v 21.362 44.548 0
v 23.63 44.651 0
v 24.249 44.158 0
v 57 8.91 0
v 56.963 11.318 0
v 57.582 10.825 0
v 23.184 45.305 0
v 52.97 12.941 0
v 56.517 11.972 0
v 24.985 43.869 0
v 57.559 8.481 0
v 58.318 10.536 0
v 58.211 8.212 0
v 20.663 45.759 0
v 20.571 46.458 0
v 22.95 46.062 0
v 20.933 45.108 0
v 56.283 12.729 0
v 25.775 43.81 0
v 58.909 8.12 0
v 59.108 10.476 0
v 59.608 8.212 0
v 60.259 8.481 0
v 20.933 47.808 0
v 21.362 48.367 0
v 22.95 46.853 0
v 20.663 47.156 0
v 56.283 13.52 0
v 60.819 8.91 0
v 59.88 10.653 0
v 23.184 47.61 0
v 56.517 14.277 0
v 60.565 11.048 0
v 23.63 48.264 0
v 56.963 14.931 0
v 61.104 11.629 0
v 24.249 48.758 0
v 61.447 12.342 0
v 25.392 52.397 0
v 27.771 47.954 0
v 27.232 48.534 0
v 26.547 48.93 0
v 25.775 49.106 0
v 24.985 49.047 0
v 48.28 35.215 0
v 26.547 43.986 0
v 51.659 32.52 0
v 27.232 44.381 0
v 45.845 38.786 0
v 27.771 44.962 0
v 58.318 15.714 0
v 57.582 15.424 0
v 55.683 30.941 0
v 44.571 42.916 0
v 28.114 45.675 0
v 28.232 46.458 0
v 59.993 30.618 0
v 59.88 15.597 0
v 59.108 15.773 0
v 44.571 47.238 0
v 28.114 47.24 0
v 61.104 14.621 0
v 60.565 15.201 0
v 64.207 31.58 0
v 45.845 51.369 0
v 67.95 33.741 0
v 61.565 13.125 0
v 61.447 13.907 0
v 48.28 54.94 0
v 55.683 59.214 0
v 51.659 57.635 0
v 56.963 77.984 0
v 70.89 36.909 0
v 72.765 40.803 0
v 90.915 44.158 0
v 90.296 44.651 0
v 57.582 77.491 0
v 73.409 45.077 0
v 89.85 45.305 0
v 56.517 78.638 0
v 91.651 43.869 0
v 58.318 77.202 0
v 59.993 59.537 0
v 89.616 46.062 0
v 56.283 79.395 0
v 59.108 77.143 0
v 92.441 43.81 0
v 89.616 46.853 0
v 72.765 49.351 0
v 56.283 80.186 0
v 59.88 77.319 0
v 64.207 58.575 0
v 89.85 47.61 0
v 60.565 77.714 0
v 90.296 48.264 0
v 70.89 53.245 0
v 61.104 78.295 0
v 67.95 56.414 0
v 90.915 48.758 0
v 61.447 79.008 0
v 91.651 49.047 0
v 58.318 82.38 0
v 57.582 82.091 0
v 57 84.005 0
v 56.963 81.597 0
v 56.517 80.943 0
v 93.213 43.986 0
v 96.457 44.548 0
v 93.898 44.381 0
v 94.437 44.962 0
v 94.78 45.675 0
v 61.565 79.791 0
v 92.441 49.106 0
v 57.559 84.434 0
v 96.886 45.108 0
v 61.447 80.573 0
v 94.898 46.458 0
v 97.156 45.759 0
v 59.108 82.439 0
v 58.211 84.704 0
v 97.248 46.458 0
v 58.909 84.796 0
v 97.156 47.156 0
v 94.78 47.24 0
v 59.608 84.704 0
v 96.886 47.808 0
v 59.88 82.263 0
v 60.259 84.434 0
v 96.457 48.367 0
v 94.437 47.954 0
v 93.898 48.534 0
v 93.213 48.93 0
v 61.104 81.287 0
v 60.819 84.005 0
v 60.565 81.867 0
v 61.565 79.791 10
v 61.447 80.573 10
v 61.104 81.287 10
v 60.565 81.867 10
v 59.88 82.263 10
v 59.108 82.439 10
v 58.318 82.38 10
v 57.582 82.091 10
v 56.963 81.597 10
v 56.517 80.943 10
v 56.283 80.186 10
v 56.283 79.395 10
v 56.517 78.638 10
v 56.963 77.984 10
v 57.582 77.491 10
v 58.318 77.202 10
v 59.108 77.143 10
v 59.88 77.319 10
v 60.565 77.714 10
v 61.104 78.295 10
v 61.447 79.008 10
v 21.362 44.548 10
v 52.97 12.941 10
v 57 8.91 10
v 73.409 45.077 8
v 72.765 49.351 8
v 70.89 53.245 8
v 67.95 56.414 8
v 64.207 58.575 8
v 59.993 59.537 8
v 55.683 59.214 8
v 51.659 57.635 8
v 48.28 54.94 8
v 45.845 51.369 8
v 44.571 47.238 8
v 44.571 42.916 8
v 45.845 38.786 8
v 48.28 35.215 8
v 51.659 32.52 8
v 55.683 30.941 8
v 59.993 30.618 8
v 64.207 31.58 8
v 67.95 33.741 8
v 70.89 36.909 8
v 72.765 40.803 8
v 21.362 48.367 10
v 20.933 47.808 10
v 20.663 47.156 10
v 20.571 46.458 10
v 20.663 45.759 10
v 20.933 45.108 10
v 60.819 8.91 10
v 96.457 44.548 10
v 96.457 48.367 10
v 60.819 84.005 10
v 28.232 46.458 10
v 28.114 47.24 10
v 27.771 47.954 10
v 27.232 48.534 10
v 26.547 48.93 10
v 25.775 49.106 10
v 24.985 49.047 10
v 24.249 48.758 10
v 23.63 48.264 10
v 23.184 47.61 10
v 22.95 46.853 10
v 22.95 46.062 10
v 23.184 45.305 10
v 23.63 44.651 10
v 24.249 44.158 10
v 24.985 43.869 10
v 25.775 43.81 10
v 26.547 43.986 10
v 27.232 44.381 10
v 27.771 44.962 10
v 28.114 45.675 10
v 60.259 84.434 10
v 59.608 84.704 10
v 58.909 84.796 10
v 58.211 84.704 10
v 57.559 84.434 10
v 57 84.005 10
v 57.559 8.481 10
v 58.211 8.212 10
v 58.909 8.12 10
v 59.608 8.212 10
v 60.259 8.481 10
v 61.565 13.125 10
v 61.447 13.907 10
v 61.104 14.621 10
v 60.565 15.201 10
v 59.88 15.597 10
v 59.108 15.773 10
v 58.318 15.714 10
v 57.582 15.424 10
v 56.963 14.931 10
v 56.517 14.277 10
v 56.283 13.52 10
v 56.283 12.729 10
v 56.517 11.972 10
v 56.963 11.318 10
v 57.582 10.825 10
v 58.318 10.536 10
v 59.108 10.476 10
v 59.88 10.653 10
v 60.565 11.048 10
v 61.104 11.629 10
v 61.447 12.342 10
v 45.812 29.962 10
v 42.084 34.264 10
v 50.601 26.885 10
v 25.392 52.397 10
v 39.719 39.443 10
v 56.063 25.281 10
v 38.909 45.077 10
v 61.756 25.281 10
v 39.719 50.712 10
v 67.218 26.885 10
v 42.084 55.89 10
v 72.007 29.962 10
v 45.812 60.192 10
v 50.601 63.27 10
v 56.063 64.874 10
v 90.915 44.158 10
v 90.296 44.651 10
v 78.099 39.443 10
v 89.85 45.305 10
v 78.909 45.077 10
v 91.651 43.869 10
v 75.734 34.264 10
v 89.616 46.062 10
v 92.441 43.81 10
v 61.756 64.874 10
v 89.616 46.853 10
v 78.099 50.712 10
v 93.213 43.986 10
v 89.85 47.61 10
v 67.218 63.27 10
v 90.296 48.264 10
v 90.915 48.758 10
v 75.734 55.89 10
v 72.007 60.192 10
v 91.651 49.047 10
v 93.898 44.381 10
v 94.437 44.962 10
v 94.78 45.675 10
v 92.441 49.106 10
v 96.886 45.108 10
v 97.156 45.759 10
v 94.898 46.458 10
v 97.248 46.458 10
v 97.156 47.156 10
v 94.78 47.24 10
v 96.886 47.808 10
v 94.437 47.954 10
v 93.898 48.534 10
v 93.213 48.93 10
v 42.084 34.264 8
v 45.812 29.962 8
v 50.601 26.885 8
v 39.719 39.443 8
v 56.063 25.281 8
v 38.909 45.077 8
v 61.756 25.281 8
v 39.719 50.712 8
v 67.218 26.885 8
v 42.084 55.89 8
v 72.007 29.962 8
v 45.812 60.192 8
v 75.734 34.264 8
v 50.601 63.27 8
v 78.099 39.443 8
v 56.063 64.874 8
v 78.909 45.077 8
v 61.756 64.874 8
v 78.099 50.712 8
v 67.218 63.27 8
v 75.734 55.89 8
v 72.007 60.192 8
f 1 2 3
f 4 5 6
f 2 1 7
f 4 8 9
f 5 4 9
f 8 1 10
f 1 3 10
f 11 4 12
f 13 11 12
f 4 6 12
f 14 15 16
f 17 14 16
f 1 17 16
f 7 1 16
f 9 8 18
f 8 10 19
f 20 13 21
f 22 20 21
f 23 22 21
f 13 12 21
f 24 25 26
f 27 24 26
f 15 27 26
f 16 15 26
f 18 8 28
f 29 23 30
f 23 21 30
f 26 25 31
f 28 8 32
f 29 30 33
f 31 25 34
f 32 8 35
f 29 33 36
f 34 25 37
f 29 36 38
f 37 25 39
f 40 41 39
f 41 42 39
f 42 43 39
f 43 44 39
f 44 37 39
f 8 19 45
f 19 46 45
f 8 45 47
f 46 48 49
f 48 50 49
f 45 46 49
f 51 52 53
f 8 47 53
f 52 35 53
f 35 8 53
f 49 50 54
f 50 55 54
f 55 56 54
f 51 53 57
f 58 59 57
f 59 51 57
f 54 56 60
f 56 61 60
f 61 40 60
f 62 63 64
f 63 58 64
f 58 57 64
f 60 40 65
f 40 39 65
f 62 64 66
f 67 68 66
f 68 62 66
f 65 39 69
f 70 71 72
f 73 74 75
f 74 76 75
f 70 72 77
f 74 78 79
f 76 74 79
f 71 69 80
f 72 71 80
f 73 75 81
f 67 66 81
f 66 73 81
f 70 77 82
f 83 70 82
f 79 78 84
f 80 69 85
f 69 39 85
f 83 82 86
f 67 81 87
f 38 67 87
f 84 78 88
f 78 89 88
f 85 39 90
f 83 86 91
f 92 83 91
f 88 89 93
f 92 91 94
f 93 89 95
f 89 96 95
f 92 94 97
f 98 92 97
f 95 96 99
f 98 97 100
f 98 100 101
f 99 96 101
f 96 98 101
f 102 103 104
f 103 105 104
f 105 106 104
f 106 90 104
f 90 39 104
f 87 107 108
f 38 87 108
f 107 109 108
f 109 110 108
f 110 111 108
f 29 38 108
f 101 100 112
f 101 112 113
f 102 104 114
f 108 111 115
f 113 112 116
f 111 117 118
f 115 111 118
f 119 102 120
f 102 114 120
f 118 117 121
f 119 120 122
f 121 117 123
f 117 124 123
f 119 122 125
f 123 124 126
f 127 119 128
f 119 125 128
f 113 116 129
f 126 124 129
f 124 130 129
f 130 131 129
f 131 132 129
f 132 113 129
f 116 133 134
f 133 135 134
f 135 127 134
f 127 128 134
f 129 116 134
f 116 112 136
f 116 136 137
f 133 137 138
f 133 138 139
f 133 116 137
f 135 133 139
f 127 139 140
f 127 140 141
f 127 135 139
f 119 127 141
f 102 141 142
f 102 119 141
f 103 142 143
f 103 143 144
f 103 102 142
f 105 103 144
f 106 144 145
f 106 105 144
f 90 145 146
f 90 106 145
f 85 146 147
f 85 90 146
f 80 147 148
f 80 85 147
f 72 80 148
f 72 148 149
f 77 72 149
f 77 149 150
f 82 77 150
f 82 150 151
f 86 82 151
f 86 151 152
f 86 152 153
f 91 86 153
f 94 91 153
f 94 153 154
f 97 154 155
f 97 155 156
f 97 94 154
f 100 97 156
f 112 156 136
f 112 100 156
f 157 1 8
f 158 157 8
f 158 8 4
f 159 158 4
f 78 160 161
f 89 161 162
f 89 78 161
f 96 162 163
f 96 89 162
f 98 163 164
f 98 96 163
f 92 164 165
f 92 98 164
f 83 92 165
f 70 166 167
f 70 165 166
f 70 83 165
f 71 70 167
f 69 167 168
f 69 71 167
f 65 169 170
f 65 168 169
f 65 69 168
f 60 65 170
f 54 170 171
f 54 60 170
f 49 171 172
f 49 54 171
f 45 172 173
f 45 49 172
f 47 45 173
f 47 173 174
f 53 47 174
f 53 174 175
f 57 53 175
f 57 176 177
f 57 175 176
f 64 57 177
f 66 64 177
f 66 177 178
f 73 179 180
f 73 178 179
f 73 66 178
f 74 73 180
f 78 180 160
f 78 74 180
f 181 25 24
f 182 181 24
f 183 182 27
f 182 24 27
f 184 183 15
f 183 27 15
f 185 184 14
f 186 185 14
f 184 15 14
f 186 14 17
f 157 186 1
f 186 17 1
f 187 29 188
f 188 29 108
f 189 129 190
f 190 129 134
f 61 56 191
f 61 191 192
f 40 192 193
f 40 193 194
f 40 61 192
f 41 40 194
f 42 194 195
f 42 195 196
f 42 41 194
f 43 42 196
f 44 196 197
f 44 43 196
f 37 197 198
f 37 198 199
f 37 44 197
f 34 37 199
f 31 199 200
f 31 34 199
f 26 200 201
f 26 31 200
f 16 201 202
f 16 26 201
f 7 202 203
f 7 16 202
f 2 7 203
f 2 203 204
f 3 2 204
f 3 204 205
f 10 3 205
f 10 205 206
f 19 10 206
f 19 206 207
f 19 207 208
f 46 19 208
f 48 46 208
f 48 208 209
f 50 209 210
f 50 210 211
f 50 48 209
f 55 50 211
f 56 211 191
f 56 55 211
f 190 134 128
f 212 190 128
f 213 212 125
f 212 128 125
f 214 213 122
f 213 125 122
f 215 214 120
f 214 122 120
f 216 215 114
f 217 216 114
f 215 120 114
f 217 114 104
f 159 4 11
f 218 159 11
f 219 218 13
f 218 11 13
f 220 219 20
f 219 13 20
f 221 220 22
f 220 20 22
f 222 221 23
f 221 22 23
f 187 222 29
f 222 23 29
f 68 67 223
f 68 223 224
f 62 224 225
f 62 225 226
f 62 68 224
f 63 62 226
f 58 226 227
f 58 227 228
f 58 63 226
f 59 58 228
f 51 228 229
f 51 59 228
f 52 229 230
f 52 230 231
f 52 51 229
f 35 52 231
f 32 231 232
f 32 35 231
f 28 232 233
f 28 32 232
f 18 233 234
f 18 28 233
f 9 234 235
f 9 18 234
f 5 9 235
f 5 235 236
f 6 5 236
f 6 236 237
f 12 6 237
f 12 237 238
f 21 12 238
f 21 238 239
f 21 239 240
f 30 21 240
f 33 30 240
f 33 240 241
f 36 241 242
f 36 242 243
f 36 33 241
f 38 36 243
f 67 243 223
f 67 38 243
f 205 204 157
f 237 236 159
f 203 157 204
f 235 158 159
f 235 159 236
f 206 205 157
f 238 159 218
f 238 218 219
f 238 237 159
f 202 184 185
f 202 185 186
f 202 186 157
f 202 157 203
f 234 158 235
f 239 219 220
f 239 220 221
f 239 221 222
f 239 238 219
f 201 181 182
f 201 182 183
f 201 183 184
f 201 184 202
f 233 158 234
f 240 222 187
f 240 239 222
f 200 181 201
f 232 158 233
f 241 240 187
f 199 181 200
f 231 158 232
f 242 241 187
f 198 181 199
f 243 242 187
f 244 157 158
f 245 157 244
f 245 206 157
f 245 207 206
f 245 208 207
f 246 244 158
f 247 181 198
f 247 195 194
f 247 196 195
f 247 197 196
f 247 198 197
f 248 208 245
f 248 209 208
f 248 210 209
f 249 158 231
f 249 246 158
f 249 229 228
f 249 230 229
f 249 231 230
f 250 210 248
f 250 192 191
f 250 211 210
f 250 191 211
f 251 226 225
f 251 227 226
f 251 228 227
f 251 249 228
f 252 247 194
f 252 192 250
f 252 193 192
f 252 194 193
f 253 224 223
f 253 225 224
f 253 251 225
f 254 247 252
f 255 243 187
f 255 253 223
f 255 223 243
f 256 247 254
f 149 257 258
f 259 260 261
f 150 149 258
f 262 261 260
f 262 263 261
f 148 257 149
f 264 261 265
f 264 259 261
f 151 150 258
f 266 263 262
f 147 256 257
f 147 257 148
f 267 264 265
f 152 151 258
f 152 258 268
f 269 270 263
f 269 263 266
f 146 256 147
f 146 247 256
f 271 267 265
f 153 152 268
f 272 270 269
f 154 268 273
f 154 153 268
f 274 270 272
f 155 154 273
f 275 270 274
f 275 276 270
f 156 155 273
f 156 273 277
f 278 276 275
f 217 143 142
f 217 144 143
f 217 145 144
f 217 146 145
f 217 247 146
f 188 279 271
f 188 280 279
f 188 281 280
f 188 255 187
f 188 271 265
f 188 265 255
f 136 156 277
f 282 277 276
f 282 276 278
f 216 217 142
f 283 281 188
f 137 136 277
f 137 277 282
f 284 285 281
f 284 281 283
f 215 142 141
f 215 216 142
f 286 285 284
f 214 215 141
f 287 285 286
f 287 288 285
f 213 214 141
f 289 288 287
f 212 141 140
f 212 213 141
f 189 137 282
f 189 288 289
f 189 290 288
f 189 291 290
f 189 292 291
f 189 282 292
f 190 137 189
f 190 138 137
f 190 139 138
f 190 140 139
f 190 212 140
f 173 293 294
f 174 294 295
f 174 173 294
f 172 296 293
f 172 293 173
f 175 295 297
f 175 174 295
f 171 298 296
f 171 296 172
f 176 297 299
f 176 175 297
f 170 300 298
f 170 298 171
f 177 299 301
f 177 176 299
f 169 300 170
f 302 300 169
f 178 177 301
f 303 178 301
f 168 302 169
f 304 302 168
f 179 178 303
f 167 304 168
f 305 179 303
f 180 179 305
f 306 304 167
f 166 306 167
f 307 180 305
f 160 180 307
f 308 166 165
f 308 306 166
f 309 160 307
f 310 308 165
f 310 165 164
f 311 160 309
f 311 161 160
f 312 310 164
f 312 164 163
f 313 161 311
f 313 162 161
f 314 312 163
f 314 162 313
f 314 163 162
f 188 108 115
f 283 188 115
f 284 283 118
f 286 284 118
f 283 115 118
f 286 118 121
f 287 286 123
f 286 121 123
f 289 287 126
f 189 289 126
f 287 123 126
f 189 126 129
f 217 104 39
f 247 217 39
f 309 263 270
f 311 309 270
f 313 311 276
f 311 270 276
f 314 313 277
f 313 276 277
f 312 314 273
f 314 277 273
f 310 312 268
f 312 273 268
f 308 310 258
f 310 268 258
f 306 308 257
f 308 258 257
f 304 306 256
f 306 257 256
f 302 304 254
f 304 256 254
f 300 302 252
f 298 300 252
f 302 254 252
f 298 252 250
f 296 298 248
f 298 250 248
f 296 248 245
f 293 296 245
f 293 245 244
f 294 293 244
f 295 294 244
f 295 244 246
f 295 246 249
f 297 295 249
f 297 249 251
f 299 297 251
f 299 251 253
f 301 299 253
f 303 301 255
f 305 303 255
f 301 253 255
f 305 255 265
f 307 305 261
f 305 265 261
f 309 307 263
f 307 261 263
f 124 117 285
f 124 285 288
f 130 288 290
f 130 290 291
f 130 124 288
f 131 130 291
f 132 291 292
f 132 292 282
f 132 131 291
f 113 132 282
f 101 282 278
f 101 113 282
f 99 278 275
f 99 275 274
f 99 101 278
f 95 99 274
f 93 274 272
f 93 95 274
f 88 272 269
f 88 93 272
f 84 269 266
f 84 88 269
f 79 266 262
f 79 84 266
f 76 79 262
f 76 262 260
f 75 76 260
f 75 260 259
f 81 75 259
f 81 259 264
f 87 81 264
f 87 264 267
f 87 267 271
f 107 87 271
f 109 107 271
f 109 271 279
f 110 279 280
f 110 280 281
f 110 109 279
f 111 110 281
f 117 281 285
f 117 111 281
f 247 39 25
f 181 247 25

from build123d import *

# Parameters (mm, degrees)
SKETCH1_R           = 14.5
SKETCH1_R_2         = 2.655602963
BOSS_EXTRUDE1_DEPTH = 10
SKETCH2_R           = 20
CUT_EXTRUDE1_DEPTH  = 2


with BuildPart() as part:
    # Sketch1 → Boss-Extrude1 (new body)
    with BuildSketch(Plane.XY):
        with BuildLine():
            Line((96.456721684, 48.36687177), (64.849048565, 79.974544889))
            Line((64.849048565, 79.974544889), (60.818539912, 84.005053542))
            ThreePointArc((60.818539912, 84.005053542), (58.909351603, 84.795865233), (57.000163293, 84.005053542))
            Line((57.000163293, 84.005053542), (25.392490174, 52.397380423))
            Line((25.392490174, 52.397380423), (21.361981522, 48.36687177))
            ThreePointArc((21.361981522, 48.36687177), (20.571169831, 46.457683461), (21.361981522, 44.548495152))
            Line((21.361981522, 44.548495152), (52.969654641, 12.940822033))
            Line((52.969654641, 12.940822033), (57.000163293, 8.91031338))
            ThreePointArc((57.000163293, 8.91031338), (58.909351603, 8.119501689), (60.818539912, 8.91031338))
            Line((60.818539912, 8.91031338), (92.426213031, 40.517986499))
            Line((92.426213031, 40.517986499), (96.456721684, 44.548495152))
            ThreePointArc((96.456721684, 44.548495152), (97.247533374, 46.457683461), (96.456721684, 48.36687177))
        make_face()
        with Locations((58.909351603, 45.077265813)):
            Circle(SKETCH1_R, mode=Mode.SUBTRACT)
        with Locations((58.909351603, 13.124669796)):
            Circle(SKETCH1_R_2, mode=Mode.SUBTRACT)
        with Locations((92.242365268, 46.457683461)):
            Circle(SKETCH1_R_2, mode=Mode.SUBTRACT)
        with Locations((58.909351603, 79.790697126)):
            Circle(SKETCH1_R_2, mode=Mode.SUBTRACT)
        with Locations((25.576337937, 46.457683461)):
            Circle(SKETCH1_R_2, mode=Mode.SUBTRACT)
    extrude(amount=BOSS_EXTRUDE1_DEPTH)

    # Sketch2 → Cut-Extrude1 (cut)
    with BuildSketch(Plane.XY.offset(10)):
        with Locations((58.909351603, 45.077265813)):
            Circle(SKETCH2_R)
    extrude(amount=-CUT_EXTRUDE1_DEPTH, mode=Mode.SUBTRACT)


solid = part.part
